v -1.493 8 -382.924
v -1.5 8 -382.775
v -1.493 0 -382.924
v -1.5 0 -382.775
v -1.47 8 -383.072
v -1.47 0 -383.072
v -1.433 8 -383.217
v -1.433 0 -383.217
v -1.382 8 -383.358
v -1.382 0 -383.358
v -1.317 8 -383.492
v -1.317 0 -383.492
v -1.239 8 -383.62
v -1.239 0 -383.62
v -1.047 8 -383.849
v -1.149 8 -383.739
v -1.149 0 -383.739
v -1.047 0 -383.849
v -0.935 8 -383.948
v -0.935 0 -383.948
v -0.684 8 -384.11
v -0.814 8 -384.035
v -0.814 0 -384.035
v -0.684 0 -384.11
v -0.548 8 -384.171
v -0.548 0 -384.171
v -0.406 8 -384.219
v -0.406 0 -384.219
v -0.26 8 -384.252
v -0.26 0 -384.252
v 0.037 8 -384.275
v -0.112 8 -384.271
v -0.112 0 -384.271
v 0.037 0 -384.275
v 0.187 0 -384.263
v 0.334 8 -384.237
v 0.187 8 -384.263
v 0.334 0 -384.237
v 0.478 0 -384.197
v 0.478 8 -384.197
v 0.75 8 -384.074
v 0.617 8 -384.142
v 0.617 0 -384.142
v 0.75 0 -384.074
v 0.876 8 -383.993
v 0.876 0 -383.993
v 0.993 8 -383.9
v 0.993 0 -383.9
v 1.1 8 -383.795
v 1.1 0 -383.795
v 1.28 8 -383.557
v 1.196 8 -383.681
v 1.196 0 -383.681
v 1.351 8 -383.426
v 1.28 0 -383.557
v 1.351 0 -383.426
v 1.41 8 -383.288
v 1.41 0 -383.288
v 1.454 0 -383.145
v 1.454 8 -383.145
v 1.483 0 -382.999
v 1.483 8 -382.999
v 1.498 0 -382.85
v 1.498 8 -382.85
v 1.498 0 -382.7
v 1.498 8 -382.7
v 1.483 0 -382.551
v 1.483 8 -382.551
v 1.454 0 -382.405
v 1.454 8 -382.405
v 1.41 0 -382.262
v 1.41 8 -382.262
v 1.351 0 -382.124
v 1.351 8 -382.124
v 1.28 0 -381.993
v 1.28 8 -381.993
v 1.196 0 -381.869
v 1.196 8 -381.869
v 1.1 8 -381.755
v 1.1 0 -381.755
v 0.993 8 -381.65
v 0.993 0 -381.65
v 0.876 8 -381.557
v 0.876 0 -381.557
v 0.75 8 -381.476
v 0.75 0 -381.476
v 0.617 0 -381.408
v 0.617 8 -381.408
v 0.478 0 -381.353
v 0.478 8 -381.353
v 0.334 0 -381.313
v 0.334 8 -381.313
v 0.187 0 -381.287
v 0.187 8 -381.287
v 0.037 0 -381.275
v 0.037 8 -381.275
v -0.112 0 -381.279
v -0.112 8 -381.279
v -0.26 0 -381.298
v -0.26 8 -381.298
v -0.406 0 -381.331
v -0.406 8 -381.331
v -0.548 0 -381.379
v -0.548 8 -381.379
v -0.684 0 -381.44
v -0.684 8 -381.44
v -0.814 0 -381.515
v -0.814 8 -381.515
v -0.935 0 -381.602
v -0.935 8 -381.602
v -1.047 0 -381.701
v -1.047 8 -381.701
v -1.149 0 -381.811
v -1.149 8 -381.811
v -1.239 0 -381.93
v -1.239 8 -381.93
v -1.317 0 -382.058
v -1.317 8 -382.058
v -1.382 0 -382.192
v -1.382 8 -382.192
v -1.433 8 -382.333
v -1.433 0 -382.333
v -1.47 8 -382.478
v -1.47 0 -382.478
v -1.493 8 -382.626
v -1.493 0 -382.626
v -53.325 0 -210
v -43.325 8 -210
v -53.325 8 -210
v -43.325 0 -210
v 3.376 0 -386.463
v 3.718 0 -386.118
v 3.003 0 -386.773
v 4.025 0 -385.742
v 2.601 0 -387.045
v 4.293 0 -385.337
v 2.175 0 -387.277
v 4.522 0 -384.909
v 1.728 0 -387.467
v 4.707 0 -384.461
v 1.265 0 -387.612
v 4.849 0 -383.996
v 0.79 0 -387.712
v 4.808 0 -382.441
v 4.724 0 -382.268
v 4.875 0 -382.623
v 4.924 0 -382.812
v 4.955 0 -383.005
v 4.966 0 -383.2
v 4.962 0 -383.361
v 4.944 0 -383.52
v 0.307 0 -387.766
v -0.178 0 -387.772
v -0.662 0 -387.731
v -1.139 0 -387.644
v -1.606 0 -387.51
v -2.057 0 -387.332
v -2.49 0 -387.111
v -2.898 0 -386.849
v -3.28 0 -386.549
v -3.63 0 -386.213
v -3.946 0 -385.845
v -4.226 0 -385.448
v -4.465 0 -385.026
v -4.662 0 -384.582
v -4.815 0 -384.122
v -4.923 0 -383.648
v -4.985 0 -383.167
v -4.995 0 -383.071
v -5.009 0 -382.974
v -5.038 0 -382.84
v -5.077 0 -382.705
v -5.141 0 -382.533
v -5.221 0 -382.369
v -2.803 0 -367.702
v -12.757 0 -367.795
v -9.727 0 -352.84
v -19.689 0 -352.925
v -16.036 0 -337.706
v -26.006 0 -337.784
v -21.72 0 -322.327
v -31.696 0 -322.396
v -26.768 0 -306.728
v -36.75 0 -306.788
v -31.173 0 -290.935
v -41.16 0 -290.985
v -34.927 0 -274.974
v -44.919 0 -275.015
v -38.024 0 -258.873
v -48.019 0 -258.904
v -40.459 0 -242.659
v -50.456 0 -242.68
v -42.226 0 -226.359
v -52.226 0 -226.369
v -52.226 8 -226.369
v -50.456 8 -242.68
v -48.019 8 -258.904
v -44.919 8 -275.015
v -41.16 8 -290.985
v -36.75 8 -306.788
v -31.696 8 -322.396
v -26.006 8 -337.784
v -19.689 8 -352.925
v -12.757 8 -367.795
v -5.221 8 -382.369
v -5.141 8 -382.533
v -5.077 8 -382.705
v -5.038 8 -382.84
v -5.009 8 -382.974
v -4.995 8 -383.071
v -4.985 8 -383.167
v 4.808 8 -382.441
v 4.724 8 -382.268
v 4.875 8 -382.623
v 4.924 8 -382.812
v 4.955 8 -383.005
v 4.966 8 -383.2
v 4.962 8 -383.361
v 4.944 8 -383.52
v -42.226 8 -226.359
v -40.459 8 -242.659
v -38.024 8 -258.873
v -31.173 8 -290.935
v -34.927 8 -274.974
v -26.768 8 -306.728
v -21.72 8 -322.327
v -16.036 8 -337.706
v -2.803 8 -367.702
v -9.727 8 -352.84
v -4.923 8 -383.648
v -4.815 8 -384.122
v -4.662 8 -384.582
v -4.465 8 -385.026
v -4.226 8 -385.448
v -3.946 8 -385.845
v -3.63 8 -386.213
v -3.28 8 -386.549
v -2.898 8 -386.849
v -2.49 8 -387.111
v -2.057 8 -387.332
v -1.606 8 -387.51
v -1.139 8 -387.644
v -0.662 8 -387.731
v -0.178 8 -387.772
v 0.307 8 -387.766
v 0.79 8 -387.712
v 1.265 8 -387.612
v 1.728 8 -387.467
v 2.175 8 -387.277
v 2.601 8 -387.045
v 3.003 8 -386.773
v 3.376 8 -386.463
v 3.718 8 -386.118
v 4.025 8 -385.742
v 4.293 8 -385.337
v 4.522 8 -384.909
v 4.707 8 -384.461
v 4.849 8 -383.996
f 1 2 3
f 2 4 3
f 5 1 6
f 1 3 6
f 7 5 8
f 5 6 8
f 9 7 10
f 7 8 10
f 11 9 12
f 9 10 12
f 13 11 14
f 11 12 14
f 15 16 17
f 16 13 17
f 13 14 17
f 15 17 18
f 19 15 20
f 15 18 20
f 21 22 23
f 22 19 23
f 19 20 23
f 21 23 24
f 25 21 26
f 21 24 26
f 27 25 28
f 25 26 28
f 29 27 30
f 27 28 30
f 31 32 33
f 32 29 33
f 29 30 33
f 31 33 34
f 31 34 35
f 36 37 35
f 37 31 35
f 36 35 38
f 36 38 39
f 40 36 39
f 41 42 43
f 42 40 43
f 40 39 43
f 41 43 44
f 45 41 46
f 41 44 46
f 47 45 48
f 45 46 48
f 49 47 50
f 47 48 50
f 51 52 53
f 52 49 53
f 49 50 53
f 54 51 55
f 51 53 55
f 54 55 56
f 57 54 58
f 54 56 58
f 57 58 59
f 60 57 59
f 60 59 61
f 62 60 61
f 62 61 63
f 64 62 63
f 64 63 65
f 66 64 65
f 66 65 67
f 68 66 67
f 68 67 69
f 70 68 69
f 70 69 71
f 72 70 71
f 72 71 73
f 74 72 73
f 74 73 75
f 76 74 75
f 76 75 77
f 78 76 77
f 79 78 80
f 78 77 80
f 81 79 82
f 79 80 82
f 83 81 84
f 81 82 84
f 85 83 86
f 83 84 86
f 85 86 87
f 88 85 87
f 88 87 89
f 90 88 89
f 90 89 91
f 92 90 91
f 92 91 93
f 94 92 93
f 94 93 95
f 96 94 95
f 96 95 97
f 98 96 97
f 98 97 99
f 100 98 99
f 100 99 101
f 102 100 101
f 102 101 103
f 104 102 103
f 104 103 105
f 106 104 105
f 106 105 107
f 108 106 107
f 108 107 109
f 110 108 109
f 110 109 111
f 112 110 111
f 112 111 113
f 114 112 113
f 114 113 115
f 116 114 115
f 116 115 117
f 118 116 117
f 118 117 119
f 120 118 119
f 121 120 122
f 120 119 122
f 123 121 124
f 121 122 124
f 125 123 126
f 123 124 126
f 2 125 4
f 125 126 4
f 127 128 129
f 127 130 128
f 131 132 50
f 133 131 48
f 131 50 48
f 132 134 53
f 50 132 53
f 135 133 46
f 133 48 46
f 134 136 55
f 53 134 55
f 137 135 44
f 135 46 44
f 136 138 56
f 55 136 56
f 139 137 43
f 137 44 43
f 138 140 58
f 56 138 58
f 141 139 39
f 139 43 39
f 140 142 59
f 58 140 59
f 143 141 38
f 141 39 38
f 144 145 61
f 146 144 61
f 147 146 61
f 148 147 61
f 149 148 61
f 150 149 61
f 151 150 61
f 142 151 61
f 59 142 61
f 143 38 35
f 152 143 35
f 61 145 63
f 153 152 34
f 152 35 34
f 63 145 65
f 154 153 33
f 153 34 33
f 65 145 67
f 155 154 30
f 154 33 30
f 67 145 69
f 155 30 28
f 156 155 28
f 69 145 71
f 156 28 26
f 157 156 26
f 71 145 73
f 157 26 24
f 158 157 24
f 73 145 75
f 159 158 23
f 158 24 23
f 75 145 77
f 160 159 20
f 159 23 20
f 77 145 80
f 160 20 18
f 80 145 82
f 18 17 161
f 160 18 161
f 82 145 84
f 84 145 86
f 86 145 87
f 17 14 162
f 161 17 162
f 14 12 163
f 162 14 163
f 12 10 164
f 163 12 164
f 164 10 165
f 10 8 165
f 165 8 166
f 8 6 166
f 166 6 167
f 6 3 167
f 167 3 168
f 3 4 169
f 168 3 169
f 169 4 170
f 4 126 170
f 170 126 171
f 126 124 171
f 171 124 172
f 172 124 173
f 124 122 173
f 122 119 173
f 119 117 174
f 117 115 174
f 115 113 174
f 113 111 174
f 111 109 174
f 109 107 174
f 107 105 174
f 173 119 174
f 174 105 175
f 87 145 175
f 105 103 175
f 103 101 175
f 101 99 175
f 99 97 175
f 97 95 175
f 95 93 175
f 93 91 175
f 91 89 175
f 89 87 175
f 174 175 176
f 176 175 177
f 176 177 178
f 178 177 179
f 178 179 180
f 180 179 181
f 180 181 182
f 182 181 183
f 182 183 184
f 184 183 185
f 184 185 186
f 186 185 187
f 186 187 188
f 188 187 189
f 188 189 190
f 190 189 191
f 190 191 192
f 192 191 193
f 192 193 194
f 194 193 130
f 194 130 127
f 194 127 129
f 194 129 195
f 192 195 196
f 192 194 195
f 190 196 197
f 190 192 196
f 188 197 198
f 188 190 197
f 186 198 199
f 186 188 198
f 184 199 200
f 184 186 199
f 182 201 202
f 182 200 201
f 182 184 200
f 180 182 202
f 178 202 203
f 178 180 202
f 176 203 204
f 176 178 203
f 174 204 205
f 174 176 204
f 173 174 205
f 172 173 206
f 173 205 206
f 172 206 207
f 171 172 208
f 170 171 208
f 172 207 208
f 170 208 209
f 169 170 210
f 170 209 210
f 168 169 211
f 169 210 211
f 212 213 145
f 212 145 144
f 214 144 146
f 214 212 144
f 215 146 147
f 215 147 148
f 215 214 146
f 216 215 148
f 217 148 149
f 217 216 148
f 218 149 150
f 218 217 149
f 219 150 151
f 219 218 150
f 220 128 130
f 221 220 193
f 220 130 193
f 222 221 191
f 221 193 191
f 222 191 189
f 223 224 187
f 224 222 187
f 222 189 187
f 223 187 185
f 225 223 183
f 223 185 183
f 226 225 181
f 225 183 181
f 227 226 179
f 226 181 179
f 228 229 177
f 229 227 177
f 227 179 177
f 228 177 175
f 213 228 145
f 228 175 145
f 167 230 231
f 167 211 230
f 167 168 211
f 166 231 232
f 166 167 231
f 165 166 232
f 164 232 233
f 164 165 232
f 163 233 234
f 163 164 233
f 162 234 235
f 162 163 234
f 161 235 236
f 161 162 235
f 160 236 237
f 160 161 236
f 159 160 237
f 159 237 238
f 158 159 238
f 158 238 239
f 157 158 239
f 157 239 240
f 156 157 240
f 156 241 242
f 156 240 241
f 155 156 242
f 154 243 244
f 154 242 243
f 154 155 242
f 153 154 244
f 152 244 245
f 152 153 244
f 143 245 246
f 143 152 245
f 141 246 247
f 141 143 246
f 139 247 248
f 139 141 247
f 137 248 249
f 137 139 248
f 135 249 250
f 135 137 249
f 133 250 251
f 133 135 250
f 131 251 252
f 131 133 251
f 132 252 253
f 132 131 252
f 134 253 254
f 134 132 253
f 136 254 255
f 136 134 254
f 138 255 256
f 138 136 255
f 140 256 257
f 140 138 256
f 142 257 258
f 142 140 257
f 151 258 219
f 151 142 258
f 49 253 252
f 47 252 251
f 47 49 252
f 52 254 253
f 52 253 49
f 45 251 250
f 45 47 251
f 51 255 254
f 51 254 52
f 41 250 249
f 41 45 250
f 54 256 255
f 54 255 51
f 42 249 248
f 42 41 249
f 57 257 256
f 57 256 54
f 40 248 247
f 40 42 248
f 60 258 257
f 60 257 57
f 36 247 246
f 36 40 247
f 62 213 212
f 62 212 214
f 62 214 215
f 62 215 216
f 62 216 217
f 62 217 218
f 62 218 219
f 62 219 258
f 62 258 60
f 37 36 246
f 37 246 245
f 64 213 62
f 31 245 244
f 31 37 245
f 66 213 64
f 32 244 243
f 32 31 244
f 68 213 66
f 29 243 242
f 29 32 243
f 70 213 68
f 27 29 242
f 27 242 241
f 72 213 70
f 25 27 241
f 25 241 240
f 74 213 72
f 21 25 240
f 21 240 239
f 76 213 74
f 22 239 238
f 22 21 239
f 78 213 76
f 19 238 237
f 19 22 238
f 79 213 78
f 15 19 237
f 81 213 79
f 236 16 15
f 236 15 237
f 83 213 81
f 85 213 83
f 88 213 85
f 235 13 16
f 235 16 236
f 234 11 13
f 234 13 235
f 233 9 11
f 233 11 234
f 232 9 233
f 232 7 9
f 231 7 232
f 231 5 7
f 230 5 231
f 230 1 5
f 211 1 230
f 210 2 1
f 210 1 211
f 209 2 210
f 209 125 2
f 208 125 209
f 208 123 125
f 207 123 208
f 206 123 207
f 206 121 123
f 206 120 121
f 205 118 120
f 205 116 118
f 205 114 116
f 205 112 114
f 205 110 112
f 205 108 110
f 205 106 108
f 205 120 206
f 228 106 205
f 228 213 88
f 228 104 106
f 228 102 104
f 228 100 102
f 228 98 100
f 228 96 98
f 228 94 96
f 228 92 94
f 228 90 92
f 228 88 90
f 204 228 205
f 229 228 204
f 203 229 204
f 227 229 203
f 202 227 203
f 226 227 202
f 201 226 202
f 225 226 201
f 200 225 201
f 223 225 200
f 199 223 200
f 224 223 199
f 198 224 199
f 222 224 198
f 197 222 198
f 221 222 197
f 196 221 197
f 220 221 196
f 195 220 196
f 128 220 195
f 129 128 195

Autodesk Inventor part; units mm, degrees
ref_plane "YZ Plane" through (0, 0, 0) normal (1, 0, 0) x (0, 1, 0)
ref_plane "XZ Plane" through (0, 0, 0) normal (0, 1, 0) x (-1, 0, 0)
ref_plane "XY Plane" through (0, 0, 0) normal (0, 0, 1) x (1, 0, 0)
sketch "Sketch1" plane through (0, 0, 0) normal (0, 1, 0) x (-1, 0, 0)
  line L0 (0, 0) -> (0, -382.775) construction
  line L1 (-5, 0) -> (-5, -382.775)
  line L2 (5, -382.775) -> (5, 0)
  arc A0 (5, 0) -> (-5, 0) centre (0, 0) ccw
  arc A1 (-5, -382.775) -> (5, -382.775) centre (0, -382.775) ccw
  circle A2 centre (0, 0) radius 1.5
  circle A3 centre (0, -382.775) radius 1.5
  arc A4 (5, -382.775) -> (5, 0) centre (-346.2418, -191.3875) ccw
  arc A5 (-5, -382.775) -> (-5, 0) centre (-356.2418, -191.3875) ccw
  point P0 (0, -191.3875)
  dimension "d0" = 382.775
  dimension "d1" = 10
  dimension "d2" = 3
  dimension "d3" = 3
  dimension "d12" = 400
  dimension "d13" = 400
extrude "Extrusion1" add sketch "Sketch1" along normal blind 8 contours A0 L2 A5 | A5 L2 A1 | A4 L2 A5
fillet "Fillet1" radius 2 4 edges at (5, 4, -382.775) (-5, 4, -382.775) (-5, 4, 0) (5, 4, 0)
sketch "Sketch2" plane through (0, 0, 0) normal (0, -1, 0) x (1, 0, 0)
  arc A0 (-4.9846, -383.1668) -> (4.9441, -383.5202) centre (0, -382.775) ccw projected
  arc A1 (4.9441, 0.7452) -> (-4.9846, 0.3918) centre (0, 0) ccw projected
  circle A2 centre (0, -382.775) radius 1.5 projected
  circle A3 centre (0, 0) radius 1.5 projected
  arc A4 (-5.2212, -0.4065) -> (-5.2212, -382.3685) centre (346.2418, -191.3875) ccw projected
  arc A5 (4.7241, -0.5073) -> (4.7241, -382.2677) centre (356.2418, -191.3875) ccw projected
  arc A6 (4.7241, -0.5073) -> (4.9441, 0.7452) centre (2.9665, 0.4471) ccw projected
  arc A7 (-5.2212, -0.4065) -> (-4.9846, 0.3918) centre (-6.9785, 0.5485) ccw projected
  arc A8 (-4.9846, -383.1668) -> (-5.2212, -382.3685) centre (-6.9785, -383.3235) ccw projected
  arc A9 (4.9441, -383.5202) -> (4.7241, -382.2677) centre (2.9665, -383.2221) ccw projected
sketch "Sketch3" plane through (0, 8, 0) normal (0, 1, 0) x (1, 0, 0)
  line L0 (-111.727, 425.5197) -> (93.4733, 425.5197)
  line L1 (93.4733, 425.5197) -> (93.4733, -68.38)
  line L2 (93.4733, -68.38) -> (-111.727, -68.38)
  line L3 (-111.727, -68.38) -> (-111.727, 425.5197)
  line L4 (-64.7929, 400.3549) -> (33.9871, 400.3549)
  line L5 (33.9871, 400.3549) -> (33.9871, 210)
  line L6 (33.9871, 210) -> (-64.7929, 210)
  line L7 (-64.7929, 210) -> (-64.7929, 400.3549)
  line L8 (-64.7929, 210) -> (33.9871, 210)
  line L9 (33.9871, 210) -> (33.9871, 30)
  line L10 (33.9871, 30) -> (-64.7929, 30)
  line L11 (-64.7929, 30) -> (-64.7929, 210)
  point P0 (0, 0)
  dimension "d15" = 30
  dimension "d16" = 180
  dimension "d17" = 190.3549
extrude "Extrusion2" cut sketch "Sketch3" along normal mid plane 20 contours L0 L1 L2 L3 | L6 L9 L10 L11
sketch "Sketch4" plane through (0, 8, 0) normal (0, 1, 0) x (1, 0, 0)
  circle A0 centre (0, 382.775) radius 1.5 projected
  line L0 (-53.3249, 210) -> (-43.3249, 210) projected
  arc A1 (4.7241, 382.2677) -> (-43.3249, 210) centre (356.2418, 191.3875) ccw projected
  arc A2 (4.7241, 382.2677) -> (4.9441, 383.5202) centre (2.9665, 383.2221) ccw projected
  arc A3 (4.9441, 383.5202) -> (-4.9846, 383.1668) centre (0, 382.775) ccw projected
  arc A4 (-5.2212, 382.3685) -> (-4.9846, 383.1668) centre (-6.9785, 383.3235) ccw projected
  arc A5 (-5.2212, 382.3685) -> (-53.3249, 210) centre (346.2418, 191.3875) ccw projected
  point P0 (0, 0)
properties part number "Part_13_p1"
